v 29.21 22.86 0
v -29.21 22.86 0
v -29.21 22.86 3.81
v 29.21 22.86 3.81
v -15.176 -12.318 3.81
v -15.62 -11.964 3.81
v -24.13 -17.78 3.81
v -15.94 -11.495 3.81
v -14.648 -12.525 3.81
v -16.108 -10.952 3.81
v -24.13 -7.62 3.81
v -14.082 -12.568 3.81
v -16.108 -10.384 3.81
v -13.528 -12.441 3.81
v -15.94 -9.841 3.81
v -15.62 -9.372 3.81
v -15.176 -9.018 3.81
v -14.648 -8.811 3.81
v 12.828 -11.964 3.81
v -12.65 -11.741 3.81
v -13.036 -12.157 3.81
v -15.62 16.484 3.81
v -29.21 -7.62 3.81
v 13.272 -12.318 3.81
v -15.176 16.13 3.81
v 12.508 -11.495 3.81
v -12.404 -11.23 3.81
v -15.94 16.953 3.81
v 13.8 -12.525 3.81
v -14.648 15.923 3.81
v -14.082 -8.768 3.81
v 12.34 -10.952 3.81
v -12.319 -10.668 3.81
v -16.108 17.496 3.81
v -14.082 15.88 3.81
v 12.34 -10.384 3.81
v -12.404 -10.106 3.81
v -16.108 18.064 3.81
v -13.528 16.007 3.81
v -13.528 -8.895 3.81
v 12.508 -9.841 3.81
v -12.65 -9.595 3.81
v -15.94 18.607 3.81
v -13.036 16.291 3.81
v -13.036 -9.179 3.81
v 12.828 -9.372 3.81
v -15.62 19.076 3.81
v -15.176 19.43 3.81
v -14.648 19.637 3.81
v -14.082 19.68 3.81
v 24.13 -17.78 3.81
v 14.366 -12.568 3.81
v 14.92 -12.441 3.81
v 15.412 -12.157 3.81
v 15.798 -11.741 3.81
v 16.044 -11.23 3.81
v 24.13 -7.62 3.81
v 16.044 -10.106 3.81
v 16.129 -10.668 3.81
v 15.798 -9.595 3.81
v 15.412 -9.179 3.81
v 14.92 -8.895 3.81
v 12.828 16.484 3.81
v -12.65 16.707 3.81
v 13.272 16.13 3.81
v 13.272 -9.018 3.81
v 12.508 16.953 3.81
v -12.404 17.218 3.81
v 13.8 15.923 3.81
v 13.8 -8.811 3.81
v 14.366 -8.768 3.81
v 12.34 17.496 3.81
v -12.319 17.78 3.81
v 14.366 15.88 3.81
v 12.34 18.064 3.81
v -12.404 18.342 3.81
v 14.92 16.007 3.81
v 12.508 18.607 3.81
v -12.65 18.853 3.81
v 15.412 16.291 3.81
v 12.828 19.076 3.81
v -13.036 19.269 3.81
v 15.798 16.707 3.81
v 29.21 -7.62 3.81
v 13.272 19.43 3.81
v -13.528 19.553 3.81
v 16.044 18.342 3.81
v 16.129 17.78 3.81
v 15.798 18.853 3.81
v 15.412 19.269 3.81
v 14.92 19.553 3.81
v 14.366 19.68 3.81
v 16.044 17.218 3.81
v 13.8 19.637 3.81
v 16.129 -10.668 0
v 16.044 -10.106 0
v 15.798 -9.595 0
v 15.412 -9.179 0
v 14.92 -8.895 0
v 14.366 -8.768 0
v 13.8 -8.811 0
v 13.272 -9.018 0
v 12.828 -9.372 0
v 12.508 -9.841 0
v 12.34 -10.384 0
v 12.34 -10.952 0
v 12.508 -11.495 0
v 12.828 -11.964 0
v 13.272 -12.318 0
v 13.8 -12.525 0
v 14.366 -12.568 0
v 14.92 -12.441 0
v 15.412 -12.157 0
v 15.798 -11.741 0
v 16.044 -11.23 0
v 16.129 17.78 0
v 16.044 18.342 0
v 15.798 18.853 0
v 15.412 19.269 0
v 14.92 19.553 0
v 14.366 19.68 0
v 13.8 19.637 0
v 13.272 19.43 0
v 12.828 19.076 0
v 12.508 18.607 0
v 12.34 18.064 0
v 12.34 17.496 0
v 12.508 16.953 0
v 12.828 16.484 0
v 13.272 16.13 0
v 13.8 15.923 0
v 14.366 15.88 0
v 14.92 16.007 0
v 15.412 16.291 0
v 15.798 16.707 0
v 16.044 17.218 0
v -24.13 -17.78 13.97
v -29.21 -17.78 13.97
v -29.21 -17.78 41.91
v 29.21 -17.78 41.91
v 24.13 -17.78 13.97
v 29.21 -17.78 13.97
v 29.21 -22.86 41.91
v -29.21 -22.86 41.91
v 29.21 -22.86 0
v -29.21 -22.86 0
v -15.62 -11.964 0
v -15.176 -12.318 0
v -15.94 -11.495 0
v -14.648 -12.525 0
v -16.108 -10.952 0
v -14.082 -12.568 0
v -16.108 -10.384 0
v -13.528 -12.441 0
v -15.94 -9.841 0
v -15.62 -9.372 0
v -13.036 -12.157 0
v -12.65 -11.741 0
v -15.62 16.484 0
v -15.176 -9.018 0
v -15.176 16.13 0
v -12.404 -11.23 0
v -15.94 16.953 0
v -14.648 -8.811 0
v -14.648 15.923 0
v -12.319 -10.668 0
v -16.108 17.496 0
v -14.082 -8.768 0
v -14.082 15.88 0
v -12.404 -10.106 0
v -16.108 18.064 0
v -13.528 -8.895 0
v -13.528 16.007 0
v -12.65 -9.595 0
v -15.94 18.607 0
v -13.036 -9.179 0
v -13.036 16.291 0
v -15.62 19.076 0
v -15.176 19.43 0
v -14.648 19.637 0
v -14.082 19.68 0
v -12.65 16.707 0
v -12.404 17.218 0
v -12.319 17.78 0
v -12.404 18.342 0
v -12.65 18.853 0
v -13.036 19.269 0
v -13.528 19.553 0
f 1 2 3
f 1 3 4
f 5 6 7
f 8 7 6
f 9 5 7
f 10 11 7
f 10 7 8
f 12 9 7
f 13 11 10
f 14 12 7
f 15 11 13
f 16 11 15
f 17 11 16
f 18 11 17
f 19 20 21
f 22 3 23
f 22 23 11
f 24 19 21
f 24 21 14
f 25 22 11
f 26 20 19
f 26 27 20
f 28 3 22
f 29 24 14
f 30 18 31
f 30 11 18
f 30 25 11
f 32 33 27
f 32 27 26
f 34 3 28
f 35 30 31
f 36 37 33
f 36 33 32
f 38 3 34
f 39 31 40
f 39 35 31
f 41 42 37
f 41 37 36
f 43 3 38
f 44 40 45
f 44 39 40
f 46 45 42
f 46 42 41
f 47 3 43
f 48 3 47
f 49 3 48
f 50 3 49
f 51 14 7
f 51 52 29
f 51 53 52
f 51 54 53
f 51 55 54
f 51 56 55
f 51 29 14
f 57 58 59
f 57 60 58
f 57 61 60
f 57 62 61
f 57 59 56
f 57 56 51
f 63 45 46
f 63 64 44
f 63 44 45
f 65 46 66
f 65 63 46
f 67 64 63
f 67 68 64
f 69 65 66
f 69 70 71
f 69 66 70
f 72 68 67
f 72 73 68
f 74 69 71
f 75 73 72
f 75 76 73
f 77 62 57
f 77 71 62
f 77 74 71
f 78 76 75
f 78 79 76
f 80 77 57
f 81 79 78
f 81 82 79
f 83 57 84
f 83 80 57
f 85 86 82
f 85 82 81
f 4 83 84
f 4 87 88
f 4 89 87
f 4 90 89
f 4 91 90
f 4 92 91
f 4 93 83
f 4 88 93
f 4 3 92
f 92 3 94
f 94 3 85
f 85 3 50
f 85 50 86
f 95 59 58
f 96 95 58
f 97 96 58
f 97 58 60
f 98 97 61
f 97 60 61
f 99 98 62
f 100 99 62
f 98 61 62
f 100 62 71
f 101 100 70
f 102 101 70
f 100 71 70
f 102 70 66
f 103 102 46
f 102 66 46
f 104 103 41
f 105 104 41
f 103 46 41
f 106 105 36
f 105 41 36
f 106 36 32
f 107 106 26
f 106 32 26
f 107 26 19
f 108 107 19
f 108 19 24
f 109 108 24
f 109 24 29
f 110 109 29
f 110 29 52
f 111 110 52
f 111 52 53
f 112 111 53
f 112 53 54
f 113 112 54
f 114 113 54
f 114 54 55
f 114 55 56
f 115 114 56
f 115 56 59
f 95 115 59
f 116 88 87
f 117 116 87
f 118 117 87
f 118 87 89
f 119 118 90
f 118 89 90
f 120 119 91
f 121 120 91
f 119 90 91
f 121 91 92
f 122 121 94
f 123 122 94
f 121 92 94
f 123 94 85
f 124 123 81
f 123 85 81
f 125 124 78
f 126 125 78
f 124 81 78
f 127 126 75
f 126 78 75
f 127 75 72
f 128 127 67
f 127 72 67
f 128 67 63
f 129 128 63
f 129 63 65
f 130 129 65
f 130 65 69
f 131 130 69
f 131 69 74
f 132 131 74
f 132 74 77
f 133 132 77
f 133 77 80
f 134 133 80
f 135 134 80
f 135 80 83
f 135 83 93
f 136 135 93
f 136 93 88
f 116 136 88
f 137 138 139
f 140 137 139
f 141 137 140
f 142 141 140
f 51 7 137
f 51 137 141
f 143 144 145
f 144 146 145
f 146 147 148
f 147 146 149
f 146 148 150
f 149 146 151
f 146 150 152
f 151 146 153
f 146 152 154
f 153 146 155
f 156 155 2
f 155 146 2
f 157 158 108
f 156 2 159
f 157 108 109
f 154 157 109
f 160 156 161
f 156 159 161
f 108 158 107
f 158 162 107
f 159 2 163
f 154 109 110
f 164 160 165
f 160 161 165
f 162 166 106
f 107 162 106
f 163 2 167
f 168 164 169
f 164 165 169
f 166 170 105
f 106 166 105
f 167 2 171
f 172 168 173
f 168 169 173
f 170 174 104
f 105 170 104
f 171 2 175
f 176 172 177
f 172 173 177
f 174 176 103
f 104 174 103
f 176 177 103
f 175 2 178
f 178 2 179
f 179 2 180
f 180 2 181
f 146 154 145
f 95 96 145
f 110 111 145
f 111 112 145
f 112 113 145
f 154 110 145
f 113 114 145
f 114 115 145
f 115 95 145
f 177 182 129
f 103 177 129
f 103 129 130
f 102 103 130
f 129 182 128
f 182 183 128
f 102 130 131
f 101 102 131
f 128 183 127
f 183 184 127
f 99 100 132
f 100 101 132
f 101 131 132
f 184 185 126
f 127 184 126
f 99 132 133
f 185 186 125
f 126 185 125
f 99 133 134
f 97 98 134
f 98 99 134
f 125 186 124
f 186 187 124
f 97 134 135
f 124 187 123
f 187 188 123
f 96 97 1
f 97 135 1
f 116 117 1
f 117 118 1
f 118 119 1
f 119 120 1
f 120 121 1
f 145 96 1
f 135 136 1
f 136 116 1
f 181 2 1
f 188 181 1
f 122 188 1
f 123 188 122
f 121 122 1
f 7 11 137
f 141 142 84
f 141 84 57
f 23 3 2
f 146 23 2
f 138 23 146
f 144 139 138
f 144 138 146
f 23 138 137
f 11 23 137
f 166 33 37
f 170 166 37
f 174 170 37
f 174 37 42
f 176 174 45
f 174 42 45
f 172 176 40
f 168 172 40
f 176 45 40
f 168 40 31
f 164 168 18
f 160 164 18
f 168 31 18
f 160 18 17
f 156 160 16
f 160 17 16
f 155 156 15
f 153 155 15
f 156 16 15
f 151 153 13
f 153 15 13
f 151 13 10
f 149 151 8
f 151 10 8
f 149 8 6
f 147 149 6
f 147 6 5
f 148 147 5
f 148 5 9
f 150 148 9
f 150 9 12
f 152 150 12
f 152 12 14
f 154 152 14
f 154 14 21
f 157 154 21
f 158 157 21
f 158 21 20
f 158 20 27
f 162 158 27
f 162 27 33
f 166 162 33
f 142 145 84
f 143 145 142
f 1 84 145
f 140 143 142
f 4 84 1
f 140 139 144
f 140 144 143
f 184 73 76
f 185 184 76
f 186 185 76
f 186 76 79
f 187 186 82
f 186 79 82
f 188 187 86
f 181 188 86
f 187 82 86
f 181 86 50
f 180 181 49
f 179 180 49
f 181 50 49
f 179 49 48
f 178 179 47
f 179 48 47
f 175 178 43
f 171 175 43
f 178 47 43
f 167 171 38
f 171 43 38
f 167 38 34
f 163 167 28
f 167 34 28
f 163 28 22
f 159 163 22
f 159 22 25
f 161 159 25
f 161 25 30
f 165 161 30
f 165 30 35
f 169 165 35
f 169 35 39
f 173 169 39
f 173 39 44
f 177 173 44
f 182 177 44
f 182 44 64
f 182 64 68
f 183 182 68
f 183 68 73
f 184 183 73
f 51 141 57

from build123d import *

# Parameters (mm, degrees)
F0_W      = 58.42
F0_H      = 45.72
F1_DEPTH  = 3.81
F2_W      = 58.42
F2_H      = 5.08
F3_DEPTH  = 38.1
F4_R      = 1.905
F5_DEPTH  = 3.811
F6_W      = 10.16
F6_H      = 10.16
F7_DEPTH  = 5.08
F8_SIZE   = 10.15999
F9_W      = 10.16
F9_H      = 10.16
F10_DEPTH = 5.08
F11_SIZE  = 10.15999


# Not quite as in the source:
# - a fillet or chamfer is up to 0.001 mm smaller than in the source, because OpenCascade refuses the exact size


with BuildPart() as f1:
    # F0 (on Top) → F1 (new body)
    with BuildSketch(Plane.XY):
        Rectangle(F0_W, F0_H)
    extrude(amount=F1_DEPTH)

    # F2 (on face) → F3 (join)
    with BuildSketch(Plane.XY.offset(3.81)):
        with Locations((0, -20.32)):
            Rectangle(F2_W, F2_H)
    extrude(amount=F3_DEPTH)

    # F4 (on face) → F5 (cut, through all)
    with BuildSketch(Plane.XY.offset(3.81)):
        with Locations((-14.224, 17.78)):
            Circle(F4_R)
        with Locations((14.224, 17.78)):
            Circle(F4_R)
        with Locations((14.224, -10.668)):
            Circle(F4_R)
        with Locations((-14.224, -10.668)):
            Circle(F4_R)
    extrude(amount=-F5_DEPTH, mode=Mode.SUBTRACT)

    # F6 (on face) → F7 (join)
    with BuildSketch(Plane(origin=(-29.21, 0, 0), x_dir=(0, -1, 0), z_dir=(-1, 0, 0))):
        with Locations((12.7, 8.89)):
            Rectangle(F6_W, F6_H)
    extrude(amount=-F7_DEPTH)

    # F8 (size 10.16 in the source; OpenCascade refuses exactly that, so slightly less here)
    f8_edges = [f1.edges().sort_by_distance(p)[0] for p in [
        (-26.67, -7.62, 13.97),
    ]]
    chamfer(f8_edges, length=F8_SIZE)

    # F9 (on face) → F10 (join)
    with BuildSketch(Plane.YZ.offset(29.21)):
        with Locations((-12.7, 8.89)):
            Rectangle(F9_W, F9_H)
    extrude(amount=-F10_DEPTH)

    # F11 (size 10.16 in the source; OpenCascade refuses exactly that, so slightly less here)
    f11_edges = [f1.edges().sort_by_distance(p)[0] for p in [
        (26.67, -7.62, 13.97),
    ]]
    chamfer(f11_edges, length=F11_SIZE)


solid = f1.part
